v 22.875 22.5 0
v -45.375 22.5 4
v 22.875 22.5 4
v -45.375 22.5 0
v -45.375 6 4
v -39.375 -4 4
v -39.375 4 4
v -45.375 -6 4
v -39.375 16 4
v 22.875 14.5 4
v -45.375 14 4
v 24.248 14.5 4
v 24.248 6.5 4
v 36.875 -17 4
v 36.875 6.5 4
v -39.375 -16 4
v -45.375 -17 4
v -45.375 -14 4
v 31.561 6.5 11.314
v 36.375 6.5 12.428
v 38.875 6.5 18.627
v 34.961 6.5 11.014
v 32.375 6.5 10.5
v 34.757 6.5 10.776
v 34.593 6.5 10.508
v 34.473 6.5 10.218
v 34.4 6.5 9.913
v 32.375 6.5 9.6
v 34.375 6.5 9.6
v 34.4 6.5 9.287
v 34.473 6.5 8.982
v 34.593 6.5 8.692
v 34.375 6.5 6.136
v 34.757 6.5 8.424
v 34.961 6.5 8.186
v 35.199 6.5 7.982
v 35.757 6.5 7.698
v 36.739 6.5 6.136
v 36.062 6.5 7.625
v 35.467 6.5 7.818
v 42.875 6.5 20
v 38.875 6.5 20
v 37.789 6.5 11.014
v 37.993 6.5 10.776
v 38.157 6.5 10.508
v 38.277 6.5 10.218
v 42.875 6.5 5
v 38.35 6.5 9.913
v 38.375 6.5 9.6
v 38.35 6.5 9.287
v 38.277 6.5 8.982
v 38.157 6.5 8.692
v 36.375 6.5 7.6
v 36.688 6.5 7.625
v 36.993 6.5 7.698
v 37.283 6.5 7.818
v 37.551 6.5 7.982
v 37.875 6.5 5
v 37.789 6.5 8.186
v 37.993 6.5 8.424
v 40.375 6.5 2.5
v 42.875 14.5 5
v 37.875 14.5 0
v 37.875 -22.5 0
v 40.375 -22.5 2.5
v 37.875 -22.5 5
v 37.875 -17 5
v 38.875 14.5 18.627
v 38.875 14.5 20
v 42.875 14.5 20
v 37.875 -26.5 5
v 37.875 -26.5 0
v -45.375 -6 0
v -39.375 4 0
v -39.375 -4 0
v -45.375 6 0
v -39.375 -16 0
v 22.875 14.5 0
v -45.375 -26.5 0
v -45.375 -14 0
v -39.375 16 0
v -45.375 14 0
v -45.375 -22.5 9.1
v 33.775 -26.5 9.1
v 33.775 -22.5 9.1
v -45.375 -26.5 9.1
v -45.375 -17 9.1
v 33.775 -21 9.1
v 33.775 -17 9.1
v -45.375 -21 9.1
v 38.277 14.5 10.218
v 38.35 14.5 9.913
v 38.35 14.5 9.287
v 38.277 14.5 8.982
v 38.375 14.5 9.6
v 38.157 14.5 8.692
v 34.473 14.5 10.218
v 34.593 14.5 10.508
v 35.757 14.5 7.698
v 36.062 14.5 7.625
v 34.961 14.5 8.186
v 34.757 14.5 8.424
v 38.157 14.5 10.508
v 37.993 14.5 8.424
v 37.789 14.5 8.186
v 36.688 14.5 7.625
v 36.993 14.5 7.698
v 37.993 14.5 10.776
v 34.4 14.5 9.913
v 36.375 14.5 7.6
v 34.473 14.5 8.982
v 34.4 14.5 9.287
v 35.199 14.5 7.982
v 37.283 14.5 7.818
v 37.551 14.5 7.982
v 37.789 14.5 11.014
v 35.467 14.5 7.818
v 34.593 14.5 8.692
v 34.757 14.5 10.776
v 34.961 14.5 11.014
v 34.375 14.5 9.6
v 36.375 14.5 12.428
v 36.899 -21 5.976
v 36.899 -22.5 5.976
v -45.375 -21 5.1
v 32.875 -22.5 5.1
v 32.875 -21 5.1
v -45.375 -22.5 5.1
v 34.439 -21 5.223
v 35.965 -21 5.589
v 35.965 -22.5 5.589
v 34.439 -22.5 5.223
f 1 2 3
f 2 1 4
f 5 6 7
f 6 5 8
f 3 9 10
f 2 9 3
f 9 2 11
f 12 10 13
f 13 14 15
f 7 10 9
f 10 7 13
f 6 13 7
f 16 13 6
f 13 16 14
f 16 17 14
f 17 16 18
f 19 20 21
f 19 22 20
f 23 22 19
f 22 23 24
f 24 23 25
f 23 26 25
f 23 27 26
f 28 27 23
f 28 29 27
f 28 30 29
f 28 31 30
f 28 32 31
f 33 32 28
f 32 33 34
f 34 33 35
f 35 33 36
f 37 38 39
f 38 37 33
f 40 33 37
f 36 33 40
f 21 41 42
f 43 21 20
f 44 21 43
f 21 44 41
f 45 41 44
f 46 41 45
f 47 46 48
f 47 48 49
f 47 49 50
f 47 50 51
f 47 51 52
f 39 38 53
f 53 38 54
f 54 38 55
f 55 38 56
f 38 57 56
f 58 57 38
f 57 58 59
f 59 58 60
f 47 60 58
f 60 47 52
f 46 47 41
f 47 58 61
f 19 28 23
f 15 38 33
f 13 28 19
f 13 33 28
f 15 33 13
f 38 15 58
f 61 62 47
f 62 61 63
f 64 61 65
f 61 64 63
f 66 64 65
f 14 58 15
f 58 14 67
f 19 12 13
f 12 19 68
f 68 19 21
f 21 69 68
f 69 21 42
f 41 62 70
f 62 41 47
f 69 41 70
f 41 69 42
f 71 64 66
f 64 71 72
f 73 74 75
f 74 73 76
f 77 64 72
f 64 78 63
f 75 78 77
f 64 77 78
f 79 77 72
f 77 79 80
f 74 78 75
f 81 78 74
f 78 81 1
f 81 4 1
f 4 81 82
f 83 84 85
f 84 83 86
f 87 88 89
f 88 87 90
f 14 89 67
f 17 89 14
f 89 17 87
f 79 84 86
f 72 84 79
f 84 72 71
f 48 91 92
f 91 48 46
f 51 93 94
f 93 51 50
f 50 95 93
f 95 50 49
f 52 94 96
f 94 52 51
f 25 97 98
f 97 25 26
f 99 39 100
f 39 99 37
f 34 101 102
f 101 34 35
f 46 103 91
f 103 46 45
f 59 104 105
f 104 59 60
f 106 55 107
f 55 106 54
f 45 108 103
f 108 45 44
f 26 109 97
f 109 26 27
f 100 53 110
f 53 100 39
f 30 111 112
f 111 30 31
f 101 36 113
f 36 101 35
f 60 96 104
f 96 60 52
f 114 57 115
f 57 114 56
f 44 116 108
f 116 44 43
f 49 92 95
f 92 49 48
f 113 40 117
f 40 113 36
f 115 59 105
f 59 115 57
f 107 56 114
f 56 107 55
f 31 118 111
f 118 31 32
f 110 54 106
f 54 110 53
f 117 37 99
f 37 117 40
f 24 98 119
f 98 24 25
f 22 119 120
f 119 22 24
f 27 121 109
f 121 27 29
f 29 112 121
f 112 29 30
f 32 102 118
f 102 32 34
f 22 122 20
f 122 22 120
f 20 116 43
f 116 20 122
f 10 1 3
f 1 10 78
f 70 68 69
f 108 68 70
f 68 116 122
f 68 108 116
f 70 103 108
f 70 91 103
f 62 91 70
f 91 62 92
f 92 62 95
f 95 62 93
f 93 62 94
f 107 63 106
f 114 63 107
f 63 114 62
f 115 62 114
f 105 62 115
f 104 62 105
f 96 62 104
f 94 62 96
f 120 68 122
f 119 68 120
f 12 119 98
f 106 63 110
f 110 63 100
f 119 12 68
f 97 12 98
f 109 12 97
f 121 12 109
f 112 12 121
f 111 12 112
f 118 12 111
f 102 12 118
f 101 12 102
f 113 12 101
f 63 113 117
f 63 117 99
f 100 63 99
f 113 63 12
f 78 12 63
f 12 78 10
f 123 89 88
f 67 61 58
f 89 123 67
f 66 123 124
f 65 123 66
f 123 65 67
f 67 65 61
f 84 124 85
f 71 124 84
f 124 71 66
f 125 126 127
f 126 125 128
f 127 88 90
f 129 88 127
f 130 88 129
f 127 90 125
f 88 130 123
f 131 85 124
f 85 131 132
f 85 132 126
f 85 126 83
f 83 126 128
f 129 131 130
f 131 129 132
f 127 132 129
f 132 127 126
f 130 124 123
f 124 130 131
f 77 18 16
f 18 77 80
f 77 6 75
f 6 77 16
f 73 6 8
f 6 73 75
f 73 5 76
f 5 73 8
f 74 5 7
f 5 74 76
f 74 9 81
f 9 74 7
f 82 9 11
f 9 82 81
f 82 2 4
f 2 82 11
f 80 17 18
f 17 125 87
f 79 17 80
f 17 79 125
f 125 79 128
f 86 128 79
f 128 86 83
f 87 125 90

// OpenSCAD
// file: ittybox.scad
include <constants.scad>

module panel(wall_thickness, side=false) {
	bolt_x = side ? bolt_offset_y : bolt_offset_x;
	bolt_z = side ? bolt_offset_x : bolt_offset_y;
	width = side ? panel_depth : panel_width;
	overlap_cutout_potition = side ? 0 : -end_corner_height;

	difference() {
		union() {
			// Main panel
			translate([0, 0, wall_thickness/2]) {
				cube([width - corner_radius*2, height, wall_thickness], center=true);
			}

			for (x = [-1, 1]) {
				// Rounded corner
				translate([x*(width/2 - corner_radius), 0, corner_radius]) {
					r = corner_radius;
					rotate([90, 0, 0]) {
						intersection() {
							cylinder(height, r=r, center=true, $fn=4);
							mirror([x > 0 ? 1 : 0, 0, 0]) translate([0, 0, -height/2]) {
								linear_extrude(height=height) polygon([[-r, r], [-r, -r], [r, -r]]);
							}
						}
					}
				}
				overlap_length = corner_overlap - corner_radius;

				// Overlap side
				translate([x*(width/2 - wall_thickness/2), 0, corner_radius + overlap_length/2]) {
					cube([wall_thickness, height, overlap_length], center=true);
				}

				// Corner chamfer
				translate([x*(width/2), height/2 - end_corner_height*2, 0]) {
					mirror([x > 0 ? 1 : 0, 0, 0])
					intersection() {
						rotate([0, 45, 0]) cube([corner_chamfer*2, height*2, corner_chamfer*2], center=true);
						translate([wall_thickness, 0, wall_thickness]) {
							cube([width/2, end_corner_height*2, corner_overlap - wall_thickness], center=false);
						}
					}
				}
			}

			if (side) {
				// Plexi support
				support_height = (panel_width - plexi_width)/2 + 4;
				translate([0, -height/2 + plexi_thickness/2, support_height/2]) {
					cube([width - corner_radius*2, plexi_thickness + 8, support_height], center=true);
				}
			}
		}

		for (x = [-1, 1]) {
			// Bolt hole
			translate([x*(width/2 - bolt_x), height/2 - end_corner_height*2, bolt_z]) {
				rotate([-90, 0, 0]) cylinder(height, d=bolt_diameter, center=false);
				rotate([0, -45, 0]) cube([bolt_diameter/2, height, bolt_diameter/2], center=false);
				bolt_depression = bolt_nut_thickness/2;
				rotate([90, 0, 0]) cylinder(bolt_nut_clearance, d=bolt_nut_width, center=false, $fn=6);
				mirror([0, 1, 0]) translate([-bolt_nut_width/2, 0, 0]) cube([bolt_nut_width, bolt_nut_clearance, bolt_nut_width], center=false);
			}

			// Overlap cutout
			translate([x*(width/2), height/2 + overlap_cutout_potition - end_corner_height/2, 0]) {
				cube([corner_overlap*2, end_corner_height, corner_overlap*4], center=true);
			}

			// Diagonal corner cut
			translate([x*(width/2), height/2 - end_corner_height*2, 0]) {
				mirror([0, 1, 0]) rotate([0, -45, 0]) cube([width, height, width], center=false);
			}
		}
	}
}

module plexi_hole() {
	hull() {
		translate([
			-plexi_width/2 + plexi_hole_offset_x + plexi_hole_diameter/2,
			-plexi_depth/2 + plexi_hole_offset_y + plexi_hole_diameter/2,
			0,
		]) {
			cylinder(plexi_thickness*2, d=plexi_hole_diameter, center=true);
			translate([0, plexi_hole_length - plexi_hole_diameter, 0]) cylinder(plexi_thickness*2, d=plexi_hole_diameter, center=true);
		}
	}
}

module plexi() {
	difference() {
		translate([0, 0, plexi_thickness/2]) {
			minkowski() {
				cube([
					plexi_width - plexi_corner_radius*2,
					plexi_depth - plexi_corner_radius*2,
					plexi_thickness/2,
				], center=true);
				cylinder(plexi_thickness/2, r=plexi_corner_radius, center=true);
			}
		}
		// plexi_hole();
		// mirror([0, 1, 0]) plexi_hole();
		// mirror([1, 0, 0]) plexi_hole();
		// rotate([0, 0, 180]) plexi_hole();
	}
}

module end_panel(wall_thickness) {
	difference() {
		panel(wall_thickness, side=false);
		translate([0, -height/2, panel_depth/2]) rotate([-90, 0, 0]) plexi();
	}
}

module side_panel(wall_thickness) {
	difference() {
		panel(wall_thickness, side=true);
		translate([0, -height/2, panel_width/2]) rotate([-90, 90, 0]) plexi();
	}
}

module button_hole() {
	cylinder(button_panel_thickness*3, d=button_diameter, center=true);
	translate([0, 0, button_panel_thickness])
		cylinder(button_panel_thickness*2, d=button_tab_diameter, center=false);
}

module back_panel() {
	wall_thickness = 8;
	difference() {
		end_panel(wall_thickness);

		// USB port panel
		translate([0, height/2, wall_thickness/2]) {
			cube([usb_panel_width, usb_panel_height*2, usb_panel_depth], center=true);
			cube([usb_panel_width-1, usb_panel_height*2, wall_thickness*2], center=true);
		}

		// Button holes
		translate([0, height/2 - usb_panel_height/2, 0]) {
			offset = usb_panel_width/2;
			for (x = [
				-(offset + button_spacing*2),
				-(offset + button_spacing),
				(offset + button_spacing),
				(offset + button_spacing*2),
			]) {
				translate([x, 0, 0]) {
					button_hole();
				}
			}
		}
	}
}

module front_panel() {
	end_panel(4);
}

module left_panel() {
	side_panel(4);
}

module right_panel() {
	wall_thickness = 4;
	switch_offset_x = panel_depth - 43;
	switch_offset_y = 8;
	difference() {
		side_panel(wall_thickness);
		translate([-panel_depth/2 + switch_offset_x, height/2 - switch_offset_y, 0]) {
			cube([12, 10, wall_thickness*3], center=true);
		}
	}
}

module panel_joint() {
	joint_inner = 8;
	joint_outer = 12;
	joint_length = 6;
	spacing = (joint_inner + joint_outer)/2;
	translate([-joint_length/2, 0, -corner_overlap])
	linear_extrude(height=corner_overlap*3)
	polygon([
		[0, height],
		[-panel_width, height],
		[-panel_width, -height],
		[0, -height],
		[0, -spacing - joint_inner/2],
		[joint_length, -spacing - joint_outer/2],
		[joint_length, -spacing + joint_outer/2],
		[0, -spacing + joint_inner/2],
		[0, spacing - joint_inner/2],
		[joint_length, spacing - joint_outer/2],
		[joint_length, spacing + joint_outer/2],
		[0, spacing + joint_inner/2],
	]);
}

module panel_split() {
  translate([0, -height, -corner_overlap*2])
  mirror([1, 0, 0])
  cube([panel_width, height*2, corner_overlap*4]);
}

back_panel();
translate([0, height*1.5, 0]) front_panel();
translate([0, height*-1.5, 0]) right_panel();
translate([0, height*-3, 0]) left_panel();
// file: constants.scad
$fn = 40;

// AllFightSticks 9.5" Button Panel - Stickless
// https://allfightsticks.com/collections/9-5-enclosures/products/9-5-button-panel?variant=21327143141455
panel_width = 228.2;
panel_depth = 171.5;
bolt_offset_x = 9.6; // distance to center of hole
bolt_offset_y = 6.5; // distance to center of hole
corner_radius = 5;

// FocusAttack Blank Plexi Cover for AllFightSticks 9.5" Solid Bottom Panel
// https://focusattack.com/blank-plexi-cover-for-allfightsticks-9-5-solid-bottom-panel/
plexi_width = 218;
plexi_depth = panel_depth;
plexi_thickness = 1.5;
plexi_hole_offset_x = 11.1; // distance to edge
plexi_hole_offset_y = 8.85; // distance to edge
plexi_hole_diameter = 8;
plexi_hole_length = 14;
plexi_corner_radius = 10;

// Sanwa SDM-18 buttons
// https://paradisearcadeshop.com/home/controls/buttons/sanwa/358-sanwa-sdm-series
button_diameter = 18;
button_tab_diameter = 24;
button_panel_thickness = 3;

// Brook Wireless Fighting Board
// https://www.brookaccessory.com/detail/41130595/
usb_panel_width = 26;
usb_panel_height = 31.2;
usb_panel_depth = 1.6;

// M4 x 20mm internal hex button-head screw
bolt_diameter = 4;
bolt_length = 20;
bolt_nut_thickness = 3.2;
bolt_nut_width = 8; // outer
bolt_nut_clearance = 10;

height = 45;
corner_overlap = 20;
end_corner_height = 8;
corner_chamfer = 16;
button_spacing = button_tab_diameter*1.2;
joint_offset = 0.5; // Accounts for extra length added by joint
// main file
include <constants.scad>
use <ittybox.scad>;

translate([-panel_depth/4, 0, 0])
difference() {
  left_panel();
  translate([joint_offset, 0, 0]) panel_joint();
}
